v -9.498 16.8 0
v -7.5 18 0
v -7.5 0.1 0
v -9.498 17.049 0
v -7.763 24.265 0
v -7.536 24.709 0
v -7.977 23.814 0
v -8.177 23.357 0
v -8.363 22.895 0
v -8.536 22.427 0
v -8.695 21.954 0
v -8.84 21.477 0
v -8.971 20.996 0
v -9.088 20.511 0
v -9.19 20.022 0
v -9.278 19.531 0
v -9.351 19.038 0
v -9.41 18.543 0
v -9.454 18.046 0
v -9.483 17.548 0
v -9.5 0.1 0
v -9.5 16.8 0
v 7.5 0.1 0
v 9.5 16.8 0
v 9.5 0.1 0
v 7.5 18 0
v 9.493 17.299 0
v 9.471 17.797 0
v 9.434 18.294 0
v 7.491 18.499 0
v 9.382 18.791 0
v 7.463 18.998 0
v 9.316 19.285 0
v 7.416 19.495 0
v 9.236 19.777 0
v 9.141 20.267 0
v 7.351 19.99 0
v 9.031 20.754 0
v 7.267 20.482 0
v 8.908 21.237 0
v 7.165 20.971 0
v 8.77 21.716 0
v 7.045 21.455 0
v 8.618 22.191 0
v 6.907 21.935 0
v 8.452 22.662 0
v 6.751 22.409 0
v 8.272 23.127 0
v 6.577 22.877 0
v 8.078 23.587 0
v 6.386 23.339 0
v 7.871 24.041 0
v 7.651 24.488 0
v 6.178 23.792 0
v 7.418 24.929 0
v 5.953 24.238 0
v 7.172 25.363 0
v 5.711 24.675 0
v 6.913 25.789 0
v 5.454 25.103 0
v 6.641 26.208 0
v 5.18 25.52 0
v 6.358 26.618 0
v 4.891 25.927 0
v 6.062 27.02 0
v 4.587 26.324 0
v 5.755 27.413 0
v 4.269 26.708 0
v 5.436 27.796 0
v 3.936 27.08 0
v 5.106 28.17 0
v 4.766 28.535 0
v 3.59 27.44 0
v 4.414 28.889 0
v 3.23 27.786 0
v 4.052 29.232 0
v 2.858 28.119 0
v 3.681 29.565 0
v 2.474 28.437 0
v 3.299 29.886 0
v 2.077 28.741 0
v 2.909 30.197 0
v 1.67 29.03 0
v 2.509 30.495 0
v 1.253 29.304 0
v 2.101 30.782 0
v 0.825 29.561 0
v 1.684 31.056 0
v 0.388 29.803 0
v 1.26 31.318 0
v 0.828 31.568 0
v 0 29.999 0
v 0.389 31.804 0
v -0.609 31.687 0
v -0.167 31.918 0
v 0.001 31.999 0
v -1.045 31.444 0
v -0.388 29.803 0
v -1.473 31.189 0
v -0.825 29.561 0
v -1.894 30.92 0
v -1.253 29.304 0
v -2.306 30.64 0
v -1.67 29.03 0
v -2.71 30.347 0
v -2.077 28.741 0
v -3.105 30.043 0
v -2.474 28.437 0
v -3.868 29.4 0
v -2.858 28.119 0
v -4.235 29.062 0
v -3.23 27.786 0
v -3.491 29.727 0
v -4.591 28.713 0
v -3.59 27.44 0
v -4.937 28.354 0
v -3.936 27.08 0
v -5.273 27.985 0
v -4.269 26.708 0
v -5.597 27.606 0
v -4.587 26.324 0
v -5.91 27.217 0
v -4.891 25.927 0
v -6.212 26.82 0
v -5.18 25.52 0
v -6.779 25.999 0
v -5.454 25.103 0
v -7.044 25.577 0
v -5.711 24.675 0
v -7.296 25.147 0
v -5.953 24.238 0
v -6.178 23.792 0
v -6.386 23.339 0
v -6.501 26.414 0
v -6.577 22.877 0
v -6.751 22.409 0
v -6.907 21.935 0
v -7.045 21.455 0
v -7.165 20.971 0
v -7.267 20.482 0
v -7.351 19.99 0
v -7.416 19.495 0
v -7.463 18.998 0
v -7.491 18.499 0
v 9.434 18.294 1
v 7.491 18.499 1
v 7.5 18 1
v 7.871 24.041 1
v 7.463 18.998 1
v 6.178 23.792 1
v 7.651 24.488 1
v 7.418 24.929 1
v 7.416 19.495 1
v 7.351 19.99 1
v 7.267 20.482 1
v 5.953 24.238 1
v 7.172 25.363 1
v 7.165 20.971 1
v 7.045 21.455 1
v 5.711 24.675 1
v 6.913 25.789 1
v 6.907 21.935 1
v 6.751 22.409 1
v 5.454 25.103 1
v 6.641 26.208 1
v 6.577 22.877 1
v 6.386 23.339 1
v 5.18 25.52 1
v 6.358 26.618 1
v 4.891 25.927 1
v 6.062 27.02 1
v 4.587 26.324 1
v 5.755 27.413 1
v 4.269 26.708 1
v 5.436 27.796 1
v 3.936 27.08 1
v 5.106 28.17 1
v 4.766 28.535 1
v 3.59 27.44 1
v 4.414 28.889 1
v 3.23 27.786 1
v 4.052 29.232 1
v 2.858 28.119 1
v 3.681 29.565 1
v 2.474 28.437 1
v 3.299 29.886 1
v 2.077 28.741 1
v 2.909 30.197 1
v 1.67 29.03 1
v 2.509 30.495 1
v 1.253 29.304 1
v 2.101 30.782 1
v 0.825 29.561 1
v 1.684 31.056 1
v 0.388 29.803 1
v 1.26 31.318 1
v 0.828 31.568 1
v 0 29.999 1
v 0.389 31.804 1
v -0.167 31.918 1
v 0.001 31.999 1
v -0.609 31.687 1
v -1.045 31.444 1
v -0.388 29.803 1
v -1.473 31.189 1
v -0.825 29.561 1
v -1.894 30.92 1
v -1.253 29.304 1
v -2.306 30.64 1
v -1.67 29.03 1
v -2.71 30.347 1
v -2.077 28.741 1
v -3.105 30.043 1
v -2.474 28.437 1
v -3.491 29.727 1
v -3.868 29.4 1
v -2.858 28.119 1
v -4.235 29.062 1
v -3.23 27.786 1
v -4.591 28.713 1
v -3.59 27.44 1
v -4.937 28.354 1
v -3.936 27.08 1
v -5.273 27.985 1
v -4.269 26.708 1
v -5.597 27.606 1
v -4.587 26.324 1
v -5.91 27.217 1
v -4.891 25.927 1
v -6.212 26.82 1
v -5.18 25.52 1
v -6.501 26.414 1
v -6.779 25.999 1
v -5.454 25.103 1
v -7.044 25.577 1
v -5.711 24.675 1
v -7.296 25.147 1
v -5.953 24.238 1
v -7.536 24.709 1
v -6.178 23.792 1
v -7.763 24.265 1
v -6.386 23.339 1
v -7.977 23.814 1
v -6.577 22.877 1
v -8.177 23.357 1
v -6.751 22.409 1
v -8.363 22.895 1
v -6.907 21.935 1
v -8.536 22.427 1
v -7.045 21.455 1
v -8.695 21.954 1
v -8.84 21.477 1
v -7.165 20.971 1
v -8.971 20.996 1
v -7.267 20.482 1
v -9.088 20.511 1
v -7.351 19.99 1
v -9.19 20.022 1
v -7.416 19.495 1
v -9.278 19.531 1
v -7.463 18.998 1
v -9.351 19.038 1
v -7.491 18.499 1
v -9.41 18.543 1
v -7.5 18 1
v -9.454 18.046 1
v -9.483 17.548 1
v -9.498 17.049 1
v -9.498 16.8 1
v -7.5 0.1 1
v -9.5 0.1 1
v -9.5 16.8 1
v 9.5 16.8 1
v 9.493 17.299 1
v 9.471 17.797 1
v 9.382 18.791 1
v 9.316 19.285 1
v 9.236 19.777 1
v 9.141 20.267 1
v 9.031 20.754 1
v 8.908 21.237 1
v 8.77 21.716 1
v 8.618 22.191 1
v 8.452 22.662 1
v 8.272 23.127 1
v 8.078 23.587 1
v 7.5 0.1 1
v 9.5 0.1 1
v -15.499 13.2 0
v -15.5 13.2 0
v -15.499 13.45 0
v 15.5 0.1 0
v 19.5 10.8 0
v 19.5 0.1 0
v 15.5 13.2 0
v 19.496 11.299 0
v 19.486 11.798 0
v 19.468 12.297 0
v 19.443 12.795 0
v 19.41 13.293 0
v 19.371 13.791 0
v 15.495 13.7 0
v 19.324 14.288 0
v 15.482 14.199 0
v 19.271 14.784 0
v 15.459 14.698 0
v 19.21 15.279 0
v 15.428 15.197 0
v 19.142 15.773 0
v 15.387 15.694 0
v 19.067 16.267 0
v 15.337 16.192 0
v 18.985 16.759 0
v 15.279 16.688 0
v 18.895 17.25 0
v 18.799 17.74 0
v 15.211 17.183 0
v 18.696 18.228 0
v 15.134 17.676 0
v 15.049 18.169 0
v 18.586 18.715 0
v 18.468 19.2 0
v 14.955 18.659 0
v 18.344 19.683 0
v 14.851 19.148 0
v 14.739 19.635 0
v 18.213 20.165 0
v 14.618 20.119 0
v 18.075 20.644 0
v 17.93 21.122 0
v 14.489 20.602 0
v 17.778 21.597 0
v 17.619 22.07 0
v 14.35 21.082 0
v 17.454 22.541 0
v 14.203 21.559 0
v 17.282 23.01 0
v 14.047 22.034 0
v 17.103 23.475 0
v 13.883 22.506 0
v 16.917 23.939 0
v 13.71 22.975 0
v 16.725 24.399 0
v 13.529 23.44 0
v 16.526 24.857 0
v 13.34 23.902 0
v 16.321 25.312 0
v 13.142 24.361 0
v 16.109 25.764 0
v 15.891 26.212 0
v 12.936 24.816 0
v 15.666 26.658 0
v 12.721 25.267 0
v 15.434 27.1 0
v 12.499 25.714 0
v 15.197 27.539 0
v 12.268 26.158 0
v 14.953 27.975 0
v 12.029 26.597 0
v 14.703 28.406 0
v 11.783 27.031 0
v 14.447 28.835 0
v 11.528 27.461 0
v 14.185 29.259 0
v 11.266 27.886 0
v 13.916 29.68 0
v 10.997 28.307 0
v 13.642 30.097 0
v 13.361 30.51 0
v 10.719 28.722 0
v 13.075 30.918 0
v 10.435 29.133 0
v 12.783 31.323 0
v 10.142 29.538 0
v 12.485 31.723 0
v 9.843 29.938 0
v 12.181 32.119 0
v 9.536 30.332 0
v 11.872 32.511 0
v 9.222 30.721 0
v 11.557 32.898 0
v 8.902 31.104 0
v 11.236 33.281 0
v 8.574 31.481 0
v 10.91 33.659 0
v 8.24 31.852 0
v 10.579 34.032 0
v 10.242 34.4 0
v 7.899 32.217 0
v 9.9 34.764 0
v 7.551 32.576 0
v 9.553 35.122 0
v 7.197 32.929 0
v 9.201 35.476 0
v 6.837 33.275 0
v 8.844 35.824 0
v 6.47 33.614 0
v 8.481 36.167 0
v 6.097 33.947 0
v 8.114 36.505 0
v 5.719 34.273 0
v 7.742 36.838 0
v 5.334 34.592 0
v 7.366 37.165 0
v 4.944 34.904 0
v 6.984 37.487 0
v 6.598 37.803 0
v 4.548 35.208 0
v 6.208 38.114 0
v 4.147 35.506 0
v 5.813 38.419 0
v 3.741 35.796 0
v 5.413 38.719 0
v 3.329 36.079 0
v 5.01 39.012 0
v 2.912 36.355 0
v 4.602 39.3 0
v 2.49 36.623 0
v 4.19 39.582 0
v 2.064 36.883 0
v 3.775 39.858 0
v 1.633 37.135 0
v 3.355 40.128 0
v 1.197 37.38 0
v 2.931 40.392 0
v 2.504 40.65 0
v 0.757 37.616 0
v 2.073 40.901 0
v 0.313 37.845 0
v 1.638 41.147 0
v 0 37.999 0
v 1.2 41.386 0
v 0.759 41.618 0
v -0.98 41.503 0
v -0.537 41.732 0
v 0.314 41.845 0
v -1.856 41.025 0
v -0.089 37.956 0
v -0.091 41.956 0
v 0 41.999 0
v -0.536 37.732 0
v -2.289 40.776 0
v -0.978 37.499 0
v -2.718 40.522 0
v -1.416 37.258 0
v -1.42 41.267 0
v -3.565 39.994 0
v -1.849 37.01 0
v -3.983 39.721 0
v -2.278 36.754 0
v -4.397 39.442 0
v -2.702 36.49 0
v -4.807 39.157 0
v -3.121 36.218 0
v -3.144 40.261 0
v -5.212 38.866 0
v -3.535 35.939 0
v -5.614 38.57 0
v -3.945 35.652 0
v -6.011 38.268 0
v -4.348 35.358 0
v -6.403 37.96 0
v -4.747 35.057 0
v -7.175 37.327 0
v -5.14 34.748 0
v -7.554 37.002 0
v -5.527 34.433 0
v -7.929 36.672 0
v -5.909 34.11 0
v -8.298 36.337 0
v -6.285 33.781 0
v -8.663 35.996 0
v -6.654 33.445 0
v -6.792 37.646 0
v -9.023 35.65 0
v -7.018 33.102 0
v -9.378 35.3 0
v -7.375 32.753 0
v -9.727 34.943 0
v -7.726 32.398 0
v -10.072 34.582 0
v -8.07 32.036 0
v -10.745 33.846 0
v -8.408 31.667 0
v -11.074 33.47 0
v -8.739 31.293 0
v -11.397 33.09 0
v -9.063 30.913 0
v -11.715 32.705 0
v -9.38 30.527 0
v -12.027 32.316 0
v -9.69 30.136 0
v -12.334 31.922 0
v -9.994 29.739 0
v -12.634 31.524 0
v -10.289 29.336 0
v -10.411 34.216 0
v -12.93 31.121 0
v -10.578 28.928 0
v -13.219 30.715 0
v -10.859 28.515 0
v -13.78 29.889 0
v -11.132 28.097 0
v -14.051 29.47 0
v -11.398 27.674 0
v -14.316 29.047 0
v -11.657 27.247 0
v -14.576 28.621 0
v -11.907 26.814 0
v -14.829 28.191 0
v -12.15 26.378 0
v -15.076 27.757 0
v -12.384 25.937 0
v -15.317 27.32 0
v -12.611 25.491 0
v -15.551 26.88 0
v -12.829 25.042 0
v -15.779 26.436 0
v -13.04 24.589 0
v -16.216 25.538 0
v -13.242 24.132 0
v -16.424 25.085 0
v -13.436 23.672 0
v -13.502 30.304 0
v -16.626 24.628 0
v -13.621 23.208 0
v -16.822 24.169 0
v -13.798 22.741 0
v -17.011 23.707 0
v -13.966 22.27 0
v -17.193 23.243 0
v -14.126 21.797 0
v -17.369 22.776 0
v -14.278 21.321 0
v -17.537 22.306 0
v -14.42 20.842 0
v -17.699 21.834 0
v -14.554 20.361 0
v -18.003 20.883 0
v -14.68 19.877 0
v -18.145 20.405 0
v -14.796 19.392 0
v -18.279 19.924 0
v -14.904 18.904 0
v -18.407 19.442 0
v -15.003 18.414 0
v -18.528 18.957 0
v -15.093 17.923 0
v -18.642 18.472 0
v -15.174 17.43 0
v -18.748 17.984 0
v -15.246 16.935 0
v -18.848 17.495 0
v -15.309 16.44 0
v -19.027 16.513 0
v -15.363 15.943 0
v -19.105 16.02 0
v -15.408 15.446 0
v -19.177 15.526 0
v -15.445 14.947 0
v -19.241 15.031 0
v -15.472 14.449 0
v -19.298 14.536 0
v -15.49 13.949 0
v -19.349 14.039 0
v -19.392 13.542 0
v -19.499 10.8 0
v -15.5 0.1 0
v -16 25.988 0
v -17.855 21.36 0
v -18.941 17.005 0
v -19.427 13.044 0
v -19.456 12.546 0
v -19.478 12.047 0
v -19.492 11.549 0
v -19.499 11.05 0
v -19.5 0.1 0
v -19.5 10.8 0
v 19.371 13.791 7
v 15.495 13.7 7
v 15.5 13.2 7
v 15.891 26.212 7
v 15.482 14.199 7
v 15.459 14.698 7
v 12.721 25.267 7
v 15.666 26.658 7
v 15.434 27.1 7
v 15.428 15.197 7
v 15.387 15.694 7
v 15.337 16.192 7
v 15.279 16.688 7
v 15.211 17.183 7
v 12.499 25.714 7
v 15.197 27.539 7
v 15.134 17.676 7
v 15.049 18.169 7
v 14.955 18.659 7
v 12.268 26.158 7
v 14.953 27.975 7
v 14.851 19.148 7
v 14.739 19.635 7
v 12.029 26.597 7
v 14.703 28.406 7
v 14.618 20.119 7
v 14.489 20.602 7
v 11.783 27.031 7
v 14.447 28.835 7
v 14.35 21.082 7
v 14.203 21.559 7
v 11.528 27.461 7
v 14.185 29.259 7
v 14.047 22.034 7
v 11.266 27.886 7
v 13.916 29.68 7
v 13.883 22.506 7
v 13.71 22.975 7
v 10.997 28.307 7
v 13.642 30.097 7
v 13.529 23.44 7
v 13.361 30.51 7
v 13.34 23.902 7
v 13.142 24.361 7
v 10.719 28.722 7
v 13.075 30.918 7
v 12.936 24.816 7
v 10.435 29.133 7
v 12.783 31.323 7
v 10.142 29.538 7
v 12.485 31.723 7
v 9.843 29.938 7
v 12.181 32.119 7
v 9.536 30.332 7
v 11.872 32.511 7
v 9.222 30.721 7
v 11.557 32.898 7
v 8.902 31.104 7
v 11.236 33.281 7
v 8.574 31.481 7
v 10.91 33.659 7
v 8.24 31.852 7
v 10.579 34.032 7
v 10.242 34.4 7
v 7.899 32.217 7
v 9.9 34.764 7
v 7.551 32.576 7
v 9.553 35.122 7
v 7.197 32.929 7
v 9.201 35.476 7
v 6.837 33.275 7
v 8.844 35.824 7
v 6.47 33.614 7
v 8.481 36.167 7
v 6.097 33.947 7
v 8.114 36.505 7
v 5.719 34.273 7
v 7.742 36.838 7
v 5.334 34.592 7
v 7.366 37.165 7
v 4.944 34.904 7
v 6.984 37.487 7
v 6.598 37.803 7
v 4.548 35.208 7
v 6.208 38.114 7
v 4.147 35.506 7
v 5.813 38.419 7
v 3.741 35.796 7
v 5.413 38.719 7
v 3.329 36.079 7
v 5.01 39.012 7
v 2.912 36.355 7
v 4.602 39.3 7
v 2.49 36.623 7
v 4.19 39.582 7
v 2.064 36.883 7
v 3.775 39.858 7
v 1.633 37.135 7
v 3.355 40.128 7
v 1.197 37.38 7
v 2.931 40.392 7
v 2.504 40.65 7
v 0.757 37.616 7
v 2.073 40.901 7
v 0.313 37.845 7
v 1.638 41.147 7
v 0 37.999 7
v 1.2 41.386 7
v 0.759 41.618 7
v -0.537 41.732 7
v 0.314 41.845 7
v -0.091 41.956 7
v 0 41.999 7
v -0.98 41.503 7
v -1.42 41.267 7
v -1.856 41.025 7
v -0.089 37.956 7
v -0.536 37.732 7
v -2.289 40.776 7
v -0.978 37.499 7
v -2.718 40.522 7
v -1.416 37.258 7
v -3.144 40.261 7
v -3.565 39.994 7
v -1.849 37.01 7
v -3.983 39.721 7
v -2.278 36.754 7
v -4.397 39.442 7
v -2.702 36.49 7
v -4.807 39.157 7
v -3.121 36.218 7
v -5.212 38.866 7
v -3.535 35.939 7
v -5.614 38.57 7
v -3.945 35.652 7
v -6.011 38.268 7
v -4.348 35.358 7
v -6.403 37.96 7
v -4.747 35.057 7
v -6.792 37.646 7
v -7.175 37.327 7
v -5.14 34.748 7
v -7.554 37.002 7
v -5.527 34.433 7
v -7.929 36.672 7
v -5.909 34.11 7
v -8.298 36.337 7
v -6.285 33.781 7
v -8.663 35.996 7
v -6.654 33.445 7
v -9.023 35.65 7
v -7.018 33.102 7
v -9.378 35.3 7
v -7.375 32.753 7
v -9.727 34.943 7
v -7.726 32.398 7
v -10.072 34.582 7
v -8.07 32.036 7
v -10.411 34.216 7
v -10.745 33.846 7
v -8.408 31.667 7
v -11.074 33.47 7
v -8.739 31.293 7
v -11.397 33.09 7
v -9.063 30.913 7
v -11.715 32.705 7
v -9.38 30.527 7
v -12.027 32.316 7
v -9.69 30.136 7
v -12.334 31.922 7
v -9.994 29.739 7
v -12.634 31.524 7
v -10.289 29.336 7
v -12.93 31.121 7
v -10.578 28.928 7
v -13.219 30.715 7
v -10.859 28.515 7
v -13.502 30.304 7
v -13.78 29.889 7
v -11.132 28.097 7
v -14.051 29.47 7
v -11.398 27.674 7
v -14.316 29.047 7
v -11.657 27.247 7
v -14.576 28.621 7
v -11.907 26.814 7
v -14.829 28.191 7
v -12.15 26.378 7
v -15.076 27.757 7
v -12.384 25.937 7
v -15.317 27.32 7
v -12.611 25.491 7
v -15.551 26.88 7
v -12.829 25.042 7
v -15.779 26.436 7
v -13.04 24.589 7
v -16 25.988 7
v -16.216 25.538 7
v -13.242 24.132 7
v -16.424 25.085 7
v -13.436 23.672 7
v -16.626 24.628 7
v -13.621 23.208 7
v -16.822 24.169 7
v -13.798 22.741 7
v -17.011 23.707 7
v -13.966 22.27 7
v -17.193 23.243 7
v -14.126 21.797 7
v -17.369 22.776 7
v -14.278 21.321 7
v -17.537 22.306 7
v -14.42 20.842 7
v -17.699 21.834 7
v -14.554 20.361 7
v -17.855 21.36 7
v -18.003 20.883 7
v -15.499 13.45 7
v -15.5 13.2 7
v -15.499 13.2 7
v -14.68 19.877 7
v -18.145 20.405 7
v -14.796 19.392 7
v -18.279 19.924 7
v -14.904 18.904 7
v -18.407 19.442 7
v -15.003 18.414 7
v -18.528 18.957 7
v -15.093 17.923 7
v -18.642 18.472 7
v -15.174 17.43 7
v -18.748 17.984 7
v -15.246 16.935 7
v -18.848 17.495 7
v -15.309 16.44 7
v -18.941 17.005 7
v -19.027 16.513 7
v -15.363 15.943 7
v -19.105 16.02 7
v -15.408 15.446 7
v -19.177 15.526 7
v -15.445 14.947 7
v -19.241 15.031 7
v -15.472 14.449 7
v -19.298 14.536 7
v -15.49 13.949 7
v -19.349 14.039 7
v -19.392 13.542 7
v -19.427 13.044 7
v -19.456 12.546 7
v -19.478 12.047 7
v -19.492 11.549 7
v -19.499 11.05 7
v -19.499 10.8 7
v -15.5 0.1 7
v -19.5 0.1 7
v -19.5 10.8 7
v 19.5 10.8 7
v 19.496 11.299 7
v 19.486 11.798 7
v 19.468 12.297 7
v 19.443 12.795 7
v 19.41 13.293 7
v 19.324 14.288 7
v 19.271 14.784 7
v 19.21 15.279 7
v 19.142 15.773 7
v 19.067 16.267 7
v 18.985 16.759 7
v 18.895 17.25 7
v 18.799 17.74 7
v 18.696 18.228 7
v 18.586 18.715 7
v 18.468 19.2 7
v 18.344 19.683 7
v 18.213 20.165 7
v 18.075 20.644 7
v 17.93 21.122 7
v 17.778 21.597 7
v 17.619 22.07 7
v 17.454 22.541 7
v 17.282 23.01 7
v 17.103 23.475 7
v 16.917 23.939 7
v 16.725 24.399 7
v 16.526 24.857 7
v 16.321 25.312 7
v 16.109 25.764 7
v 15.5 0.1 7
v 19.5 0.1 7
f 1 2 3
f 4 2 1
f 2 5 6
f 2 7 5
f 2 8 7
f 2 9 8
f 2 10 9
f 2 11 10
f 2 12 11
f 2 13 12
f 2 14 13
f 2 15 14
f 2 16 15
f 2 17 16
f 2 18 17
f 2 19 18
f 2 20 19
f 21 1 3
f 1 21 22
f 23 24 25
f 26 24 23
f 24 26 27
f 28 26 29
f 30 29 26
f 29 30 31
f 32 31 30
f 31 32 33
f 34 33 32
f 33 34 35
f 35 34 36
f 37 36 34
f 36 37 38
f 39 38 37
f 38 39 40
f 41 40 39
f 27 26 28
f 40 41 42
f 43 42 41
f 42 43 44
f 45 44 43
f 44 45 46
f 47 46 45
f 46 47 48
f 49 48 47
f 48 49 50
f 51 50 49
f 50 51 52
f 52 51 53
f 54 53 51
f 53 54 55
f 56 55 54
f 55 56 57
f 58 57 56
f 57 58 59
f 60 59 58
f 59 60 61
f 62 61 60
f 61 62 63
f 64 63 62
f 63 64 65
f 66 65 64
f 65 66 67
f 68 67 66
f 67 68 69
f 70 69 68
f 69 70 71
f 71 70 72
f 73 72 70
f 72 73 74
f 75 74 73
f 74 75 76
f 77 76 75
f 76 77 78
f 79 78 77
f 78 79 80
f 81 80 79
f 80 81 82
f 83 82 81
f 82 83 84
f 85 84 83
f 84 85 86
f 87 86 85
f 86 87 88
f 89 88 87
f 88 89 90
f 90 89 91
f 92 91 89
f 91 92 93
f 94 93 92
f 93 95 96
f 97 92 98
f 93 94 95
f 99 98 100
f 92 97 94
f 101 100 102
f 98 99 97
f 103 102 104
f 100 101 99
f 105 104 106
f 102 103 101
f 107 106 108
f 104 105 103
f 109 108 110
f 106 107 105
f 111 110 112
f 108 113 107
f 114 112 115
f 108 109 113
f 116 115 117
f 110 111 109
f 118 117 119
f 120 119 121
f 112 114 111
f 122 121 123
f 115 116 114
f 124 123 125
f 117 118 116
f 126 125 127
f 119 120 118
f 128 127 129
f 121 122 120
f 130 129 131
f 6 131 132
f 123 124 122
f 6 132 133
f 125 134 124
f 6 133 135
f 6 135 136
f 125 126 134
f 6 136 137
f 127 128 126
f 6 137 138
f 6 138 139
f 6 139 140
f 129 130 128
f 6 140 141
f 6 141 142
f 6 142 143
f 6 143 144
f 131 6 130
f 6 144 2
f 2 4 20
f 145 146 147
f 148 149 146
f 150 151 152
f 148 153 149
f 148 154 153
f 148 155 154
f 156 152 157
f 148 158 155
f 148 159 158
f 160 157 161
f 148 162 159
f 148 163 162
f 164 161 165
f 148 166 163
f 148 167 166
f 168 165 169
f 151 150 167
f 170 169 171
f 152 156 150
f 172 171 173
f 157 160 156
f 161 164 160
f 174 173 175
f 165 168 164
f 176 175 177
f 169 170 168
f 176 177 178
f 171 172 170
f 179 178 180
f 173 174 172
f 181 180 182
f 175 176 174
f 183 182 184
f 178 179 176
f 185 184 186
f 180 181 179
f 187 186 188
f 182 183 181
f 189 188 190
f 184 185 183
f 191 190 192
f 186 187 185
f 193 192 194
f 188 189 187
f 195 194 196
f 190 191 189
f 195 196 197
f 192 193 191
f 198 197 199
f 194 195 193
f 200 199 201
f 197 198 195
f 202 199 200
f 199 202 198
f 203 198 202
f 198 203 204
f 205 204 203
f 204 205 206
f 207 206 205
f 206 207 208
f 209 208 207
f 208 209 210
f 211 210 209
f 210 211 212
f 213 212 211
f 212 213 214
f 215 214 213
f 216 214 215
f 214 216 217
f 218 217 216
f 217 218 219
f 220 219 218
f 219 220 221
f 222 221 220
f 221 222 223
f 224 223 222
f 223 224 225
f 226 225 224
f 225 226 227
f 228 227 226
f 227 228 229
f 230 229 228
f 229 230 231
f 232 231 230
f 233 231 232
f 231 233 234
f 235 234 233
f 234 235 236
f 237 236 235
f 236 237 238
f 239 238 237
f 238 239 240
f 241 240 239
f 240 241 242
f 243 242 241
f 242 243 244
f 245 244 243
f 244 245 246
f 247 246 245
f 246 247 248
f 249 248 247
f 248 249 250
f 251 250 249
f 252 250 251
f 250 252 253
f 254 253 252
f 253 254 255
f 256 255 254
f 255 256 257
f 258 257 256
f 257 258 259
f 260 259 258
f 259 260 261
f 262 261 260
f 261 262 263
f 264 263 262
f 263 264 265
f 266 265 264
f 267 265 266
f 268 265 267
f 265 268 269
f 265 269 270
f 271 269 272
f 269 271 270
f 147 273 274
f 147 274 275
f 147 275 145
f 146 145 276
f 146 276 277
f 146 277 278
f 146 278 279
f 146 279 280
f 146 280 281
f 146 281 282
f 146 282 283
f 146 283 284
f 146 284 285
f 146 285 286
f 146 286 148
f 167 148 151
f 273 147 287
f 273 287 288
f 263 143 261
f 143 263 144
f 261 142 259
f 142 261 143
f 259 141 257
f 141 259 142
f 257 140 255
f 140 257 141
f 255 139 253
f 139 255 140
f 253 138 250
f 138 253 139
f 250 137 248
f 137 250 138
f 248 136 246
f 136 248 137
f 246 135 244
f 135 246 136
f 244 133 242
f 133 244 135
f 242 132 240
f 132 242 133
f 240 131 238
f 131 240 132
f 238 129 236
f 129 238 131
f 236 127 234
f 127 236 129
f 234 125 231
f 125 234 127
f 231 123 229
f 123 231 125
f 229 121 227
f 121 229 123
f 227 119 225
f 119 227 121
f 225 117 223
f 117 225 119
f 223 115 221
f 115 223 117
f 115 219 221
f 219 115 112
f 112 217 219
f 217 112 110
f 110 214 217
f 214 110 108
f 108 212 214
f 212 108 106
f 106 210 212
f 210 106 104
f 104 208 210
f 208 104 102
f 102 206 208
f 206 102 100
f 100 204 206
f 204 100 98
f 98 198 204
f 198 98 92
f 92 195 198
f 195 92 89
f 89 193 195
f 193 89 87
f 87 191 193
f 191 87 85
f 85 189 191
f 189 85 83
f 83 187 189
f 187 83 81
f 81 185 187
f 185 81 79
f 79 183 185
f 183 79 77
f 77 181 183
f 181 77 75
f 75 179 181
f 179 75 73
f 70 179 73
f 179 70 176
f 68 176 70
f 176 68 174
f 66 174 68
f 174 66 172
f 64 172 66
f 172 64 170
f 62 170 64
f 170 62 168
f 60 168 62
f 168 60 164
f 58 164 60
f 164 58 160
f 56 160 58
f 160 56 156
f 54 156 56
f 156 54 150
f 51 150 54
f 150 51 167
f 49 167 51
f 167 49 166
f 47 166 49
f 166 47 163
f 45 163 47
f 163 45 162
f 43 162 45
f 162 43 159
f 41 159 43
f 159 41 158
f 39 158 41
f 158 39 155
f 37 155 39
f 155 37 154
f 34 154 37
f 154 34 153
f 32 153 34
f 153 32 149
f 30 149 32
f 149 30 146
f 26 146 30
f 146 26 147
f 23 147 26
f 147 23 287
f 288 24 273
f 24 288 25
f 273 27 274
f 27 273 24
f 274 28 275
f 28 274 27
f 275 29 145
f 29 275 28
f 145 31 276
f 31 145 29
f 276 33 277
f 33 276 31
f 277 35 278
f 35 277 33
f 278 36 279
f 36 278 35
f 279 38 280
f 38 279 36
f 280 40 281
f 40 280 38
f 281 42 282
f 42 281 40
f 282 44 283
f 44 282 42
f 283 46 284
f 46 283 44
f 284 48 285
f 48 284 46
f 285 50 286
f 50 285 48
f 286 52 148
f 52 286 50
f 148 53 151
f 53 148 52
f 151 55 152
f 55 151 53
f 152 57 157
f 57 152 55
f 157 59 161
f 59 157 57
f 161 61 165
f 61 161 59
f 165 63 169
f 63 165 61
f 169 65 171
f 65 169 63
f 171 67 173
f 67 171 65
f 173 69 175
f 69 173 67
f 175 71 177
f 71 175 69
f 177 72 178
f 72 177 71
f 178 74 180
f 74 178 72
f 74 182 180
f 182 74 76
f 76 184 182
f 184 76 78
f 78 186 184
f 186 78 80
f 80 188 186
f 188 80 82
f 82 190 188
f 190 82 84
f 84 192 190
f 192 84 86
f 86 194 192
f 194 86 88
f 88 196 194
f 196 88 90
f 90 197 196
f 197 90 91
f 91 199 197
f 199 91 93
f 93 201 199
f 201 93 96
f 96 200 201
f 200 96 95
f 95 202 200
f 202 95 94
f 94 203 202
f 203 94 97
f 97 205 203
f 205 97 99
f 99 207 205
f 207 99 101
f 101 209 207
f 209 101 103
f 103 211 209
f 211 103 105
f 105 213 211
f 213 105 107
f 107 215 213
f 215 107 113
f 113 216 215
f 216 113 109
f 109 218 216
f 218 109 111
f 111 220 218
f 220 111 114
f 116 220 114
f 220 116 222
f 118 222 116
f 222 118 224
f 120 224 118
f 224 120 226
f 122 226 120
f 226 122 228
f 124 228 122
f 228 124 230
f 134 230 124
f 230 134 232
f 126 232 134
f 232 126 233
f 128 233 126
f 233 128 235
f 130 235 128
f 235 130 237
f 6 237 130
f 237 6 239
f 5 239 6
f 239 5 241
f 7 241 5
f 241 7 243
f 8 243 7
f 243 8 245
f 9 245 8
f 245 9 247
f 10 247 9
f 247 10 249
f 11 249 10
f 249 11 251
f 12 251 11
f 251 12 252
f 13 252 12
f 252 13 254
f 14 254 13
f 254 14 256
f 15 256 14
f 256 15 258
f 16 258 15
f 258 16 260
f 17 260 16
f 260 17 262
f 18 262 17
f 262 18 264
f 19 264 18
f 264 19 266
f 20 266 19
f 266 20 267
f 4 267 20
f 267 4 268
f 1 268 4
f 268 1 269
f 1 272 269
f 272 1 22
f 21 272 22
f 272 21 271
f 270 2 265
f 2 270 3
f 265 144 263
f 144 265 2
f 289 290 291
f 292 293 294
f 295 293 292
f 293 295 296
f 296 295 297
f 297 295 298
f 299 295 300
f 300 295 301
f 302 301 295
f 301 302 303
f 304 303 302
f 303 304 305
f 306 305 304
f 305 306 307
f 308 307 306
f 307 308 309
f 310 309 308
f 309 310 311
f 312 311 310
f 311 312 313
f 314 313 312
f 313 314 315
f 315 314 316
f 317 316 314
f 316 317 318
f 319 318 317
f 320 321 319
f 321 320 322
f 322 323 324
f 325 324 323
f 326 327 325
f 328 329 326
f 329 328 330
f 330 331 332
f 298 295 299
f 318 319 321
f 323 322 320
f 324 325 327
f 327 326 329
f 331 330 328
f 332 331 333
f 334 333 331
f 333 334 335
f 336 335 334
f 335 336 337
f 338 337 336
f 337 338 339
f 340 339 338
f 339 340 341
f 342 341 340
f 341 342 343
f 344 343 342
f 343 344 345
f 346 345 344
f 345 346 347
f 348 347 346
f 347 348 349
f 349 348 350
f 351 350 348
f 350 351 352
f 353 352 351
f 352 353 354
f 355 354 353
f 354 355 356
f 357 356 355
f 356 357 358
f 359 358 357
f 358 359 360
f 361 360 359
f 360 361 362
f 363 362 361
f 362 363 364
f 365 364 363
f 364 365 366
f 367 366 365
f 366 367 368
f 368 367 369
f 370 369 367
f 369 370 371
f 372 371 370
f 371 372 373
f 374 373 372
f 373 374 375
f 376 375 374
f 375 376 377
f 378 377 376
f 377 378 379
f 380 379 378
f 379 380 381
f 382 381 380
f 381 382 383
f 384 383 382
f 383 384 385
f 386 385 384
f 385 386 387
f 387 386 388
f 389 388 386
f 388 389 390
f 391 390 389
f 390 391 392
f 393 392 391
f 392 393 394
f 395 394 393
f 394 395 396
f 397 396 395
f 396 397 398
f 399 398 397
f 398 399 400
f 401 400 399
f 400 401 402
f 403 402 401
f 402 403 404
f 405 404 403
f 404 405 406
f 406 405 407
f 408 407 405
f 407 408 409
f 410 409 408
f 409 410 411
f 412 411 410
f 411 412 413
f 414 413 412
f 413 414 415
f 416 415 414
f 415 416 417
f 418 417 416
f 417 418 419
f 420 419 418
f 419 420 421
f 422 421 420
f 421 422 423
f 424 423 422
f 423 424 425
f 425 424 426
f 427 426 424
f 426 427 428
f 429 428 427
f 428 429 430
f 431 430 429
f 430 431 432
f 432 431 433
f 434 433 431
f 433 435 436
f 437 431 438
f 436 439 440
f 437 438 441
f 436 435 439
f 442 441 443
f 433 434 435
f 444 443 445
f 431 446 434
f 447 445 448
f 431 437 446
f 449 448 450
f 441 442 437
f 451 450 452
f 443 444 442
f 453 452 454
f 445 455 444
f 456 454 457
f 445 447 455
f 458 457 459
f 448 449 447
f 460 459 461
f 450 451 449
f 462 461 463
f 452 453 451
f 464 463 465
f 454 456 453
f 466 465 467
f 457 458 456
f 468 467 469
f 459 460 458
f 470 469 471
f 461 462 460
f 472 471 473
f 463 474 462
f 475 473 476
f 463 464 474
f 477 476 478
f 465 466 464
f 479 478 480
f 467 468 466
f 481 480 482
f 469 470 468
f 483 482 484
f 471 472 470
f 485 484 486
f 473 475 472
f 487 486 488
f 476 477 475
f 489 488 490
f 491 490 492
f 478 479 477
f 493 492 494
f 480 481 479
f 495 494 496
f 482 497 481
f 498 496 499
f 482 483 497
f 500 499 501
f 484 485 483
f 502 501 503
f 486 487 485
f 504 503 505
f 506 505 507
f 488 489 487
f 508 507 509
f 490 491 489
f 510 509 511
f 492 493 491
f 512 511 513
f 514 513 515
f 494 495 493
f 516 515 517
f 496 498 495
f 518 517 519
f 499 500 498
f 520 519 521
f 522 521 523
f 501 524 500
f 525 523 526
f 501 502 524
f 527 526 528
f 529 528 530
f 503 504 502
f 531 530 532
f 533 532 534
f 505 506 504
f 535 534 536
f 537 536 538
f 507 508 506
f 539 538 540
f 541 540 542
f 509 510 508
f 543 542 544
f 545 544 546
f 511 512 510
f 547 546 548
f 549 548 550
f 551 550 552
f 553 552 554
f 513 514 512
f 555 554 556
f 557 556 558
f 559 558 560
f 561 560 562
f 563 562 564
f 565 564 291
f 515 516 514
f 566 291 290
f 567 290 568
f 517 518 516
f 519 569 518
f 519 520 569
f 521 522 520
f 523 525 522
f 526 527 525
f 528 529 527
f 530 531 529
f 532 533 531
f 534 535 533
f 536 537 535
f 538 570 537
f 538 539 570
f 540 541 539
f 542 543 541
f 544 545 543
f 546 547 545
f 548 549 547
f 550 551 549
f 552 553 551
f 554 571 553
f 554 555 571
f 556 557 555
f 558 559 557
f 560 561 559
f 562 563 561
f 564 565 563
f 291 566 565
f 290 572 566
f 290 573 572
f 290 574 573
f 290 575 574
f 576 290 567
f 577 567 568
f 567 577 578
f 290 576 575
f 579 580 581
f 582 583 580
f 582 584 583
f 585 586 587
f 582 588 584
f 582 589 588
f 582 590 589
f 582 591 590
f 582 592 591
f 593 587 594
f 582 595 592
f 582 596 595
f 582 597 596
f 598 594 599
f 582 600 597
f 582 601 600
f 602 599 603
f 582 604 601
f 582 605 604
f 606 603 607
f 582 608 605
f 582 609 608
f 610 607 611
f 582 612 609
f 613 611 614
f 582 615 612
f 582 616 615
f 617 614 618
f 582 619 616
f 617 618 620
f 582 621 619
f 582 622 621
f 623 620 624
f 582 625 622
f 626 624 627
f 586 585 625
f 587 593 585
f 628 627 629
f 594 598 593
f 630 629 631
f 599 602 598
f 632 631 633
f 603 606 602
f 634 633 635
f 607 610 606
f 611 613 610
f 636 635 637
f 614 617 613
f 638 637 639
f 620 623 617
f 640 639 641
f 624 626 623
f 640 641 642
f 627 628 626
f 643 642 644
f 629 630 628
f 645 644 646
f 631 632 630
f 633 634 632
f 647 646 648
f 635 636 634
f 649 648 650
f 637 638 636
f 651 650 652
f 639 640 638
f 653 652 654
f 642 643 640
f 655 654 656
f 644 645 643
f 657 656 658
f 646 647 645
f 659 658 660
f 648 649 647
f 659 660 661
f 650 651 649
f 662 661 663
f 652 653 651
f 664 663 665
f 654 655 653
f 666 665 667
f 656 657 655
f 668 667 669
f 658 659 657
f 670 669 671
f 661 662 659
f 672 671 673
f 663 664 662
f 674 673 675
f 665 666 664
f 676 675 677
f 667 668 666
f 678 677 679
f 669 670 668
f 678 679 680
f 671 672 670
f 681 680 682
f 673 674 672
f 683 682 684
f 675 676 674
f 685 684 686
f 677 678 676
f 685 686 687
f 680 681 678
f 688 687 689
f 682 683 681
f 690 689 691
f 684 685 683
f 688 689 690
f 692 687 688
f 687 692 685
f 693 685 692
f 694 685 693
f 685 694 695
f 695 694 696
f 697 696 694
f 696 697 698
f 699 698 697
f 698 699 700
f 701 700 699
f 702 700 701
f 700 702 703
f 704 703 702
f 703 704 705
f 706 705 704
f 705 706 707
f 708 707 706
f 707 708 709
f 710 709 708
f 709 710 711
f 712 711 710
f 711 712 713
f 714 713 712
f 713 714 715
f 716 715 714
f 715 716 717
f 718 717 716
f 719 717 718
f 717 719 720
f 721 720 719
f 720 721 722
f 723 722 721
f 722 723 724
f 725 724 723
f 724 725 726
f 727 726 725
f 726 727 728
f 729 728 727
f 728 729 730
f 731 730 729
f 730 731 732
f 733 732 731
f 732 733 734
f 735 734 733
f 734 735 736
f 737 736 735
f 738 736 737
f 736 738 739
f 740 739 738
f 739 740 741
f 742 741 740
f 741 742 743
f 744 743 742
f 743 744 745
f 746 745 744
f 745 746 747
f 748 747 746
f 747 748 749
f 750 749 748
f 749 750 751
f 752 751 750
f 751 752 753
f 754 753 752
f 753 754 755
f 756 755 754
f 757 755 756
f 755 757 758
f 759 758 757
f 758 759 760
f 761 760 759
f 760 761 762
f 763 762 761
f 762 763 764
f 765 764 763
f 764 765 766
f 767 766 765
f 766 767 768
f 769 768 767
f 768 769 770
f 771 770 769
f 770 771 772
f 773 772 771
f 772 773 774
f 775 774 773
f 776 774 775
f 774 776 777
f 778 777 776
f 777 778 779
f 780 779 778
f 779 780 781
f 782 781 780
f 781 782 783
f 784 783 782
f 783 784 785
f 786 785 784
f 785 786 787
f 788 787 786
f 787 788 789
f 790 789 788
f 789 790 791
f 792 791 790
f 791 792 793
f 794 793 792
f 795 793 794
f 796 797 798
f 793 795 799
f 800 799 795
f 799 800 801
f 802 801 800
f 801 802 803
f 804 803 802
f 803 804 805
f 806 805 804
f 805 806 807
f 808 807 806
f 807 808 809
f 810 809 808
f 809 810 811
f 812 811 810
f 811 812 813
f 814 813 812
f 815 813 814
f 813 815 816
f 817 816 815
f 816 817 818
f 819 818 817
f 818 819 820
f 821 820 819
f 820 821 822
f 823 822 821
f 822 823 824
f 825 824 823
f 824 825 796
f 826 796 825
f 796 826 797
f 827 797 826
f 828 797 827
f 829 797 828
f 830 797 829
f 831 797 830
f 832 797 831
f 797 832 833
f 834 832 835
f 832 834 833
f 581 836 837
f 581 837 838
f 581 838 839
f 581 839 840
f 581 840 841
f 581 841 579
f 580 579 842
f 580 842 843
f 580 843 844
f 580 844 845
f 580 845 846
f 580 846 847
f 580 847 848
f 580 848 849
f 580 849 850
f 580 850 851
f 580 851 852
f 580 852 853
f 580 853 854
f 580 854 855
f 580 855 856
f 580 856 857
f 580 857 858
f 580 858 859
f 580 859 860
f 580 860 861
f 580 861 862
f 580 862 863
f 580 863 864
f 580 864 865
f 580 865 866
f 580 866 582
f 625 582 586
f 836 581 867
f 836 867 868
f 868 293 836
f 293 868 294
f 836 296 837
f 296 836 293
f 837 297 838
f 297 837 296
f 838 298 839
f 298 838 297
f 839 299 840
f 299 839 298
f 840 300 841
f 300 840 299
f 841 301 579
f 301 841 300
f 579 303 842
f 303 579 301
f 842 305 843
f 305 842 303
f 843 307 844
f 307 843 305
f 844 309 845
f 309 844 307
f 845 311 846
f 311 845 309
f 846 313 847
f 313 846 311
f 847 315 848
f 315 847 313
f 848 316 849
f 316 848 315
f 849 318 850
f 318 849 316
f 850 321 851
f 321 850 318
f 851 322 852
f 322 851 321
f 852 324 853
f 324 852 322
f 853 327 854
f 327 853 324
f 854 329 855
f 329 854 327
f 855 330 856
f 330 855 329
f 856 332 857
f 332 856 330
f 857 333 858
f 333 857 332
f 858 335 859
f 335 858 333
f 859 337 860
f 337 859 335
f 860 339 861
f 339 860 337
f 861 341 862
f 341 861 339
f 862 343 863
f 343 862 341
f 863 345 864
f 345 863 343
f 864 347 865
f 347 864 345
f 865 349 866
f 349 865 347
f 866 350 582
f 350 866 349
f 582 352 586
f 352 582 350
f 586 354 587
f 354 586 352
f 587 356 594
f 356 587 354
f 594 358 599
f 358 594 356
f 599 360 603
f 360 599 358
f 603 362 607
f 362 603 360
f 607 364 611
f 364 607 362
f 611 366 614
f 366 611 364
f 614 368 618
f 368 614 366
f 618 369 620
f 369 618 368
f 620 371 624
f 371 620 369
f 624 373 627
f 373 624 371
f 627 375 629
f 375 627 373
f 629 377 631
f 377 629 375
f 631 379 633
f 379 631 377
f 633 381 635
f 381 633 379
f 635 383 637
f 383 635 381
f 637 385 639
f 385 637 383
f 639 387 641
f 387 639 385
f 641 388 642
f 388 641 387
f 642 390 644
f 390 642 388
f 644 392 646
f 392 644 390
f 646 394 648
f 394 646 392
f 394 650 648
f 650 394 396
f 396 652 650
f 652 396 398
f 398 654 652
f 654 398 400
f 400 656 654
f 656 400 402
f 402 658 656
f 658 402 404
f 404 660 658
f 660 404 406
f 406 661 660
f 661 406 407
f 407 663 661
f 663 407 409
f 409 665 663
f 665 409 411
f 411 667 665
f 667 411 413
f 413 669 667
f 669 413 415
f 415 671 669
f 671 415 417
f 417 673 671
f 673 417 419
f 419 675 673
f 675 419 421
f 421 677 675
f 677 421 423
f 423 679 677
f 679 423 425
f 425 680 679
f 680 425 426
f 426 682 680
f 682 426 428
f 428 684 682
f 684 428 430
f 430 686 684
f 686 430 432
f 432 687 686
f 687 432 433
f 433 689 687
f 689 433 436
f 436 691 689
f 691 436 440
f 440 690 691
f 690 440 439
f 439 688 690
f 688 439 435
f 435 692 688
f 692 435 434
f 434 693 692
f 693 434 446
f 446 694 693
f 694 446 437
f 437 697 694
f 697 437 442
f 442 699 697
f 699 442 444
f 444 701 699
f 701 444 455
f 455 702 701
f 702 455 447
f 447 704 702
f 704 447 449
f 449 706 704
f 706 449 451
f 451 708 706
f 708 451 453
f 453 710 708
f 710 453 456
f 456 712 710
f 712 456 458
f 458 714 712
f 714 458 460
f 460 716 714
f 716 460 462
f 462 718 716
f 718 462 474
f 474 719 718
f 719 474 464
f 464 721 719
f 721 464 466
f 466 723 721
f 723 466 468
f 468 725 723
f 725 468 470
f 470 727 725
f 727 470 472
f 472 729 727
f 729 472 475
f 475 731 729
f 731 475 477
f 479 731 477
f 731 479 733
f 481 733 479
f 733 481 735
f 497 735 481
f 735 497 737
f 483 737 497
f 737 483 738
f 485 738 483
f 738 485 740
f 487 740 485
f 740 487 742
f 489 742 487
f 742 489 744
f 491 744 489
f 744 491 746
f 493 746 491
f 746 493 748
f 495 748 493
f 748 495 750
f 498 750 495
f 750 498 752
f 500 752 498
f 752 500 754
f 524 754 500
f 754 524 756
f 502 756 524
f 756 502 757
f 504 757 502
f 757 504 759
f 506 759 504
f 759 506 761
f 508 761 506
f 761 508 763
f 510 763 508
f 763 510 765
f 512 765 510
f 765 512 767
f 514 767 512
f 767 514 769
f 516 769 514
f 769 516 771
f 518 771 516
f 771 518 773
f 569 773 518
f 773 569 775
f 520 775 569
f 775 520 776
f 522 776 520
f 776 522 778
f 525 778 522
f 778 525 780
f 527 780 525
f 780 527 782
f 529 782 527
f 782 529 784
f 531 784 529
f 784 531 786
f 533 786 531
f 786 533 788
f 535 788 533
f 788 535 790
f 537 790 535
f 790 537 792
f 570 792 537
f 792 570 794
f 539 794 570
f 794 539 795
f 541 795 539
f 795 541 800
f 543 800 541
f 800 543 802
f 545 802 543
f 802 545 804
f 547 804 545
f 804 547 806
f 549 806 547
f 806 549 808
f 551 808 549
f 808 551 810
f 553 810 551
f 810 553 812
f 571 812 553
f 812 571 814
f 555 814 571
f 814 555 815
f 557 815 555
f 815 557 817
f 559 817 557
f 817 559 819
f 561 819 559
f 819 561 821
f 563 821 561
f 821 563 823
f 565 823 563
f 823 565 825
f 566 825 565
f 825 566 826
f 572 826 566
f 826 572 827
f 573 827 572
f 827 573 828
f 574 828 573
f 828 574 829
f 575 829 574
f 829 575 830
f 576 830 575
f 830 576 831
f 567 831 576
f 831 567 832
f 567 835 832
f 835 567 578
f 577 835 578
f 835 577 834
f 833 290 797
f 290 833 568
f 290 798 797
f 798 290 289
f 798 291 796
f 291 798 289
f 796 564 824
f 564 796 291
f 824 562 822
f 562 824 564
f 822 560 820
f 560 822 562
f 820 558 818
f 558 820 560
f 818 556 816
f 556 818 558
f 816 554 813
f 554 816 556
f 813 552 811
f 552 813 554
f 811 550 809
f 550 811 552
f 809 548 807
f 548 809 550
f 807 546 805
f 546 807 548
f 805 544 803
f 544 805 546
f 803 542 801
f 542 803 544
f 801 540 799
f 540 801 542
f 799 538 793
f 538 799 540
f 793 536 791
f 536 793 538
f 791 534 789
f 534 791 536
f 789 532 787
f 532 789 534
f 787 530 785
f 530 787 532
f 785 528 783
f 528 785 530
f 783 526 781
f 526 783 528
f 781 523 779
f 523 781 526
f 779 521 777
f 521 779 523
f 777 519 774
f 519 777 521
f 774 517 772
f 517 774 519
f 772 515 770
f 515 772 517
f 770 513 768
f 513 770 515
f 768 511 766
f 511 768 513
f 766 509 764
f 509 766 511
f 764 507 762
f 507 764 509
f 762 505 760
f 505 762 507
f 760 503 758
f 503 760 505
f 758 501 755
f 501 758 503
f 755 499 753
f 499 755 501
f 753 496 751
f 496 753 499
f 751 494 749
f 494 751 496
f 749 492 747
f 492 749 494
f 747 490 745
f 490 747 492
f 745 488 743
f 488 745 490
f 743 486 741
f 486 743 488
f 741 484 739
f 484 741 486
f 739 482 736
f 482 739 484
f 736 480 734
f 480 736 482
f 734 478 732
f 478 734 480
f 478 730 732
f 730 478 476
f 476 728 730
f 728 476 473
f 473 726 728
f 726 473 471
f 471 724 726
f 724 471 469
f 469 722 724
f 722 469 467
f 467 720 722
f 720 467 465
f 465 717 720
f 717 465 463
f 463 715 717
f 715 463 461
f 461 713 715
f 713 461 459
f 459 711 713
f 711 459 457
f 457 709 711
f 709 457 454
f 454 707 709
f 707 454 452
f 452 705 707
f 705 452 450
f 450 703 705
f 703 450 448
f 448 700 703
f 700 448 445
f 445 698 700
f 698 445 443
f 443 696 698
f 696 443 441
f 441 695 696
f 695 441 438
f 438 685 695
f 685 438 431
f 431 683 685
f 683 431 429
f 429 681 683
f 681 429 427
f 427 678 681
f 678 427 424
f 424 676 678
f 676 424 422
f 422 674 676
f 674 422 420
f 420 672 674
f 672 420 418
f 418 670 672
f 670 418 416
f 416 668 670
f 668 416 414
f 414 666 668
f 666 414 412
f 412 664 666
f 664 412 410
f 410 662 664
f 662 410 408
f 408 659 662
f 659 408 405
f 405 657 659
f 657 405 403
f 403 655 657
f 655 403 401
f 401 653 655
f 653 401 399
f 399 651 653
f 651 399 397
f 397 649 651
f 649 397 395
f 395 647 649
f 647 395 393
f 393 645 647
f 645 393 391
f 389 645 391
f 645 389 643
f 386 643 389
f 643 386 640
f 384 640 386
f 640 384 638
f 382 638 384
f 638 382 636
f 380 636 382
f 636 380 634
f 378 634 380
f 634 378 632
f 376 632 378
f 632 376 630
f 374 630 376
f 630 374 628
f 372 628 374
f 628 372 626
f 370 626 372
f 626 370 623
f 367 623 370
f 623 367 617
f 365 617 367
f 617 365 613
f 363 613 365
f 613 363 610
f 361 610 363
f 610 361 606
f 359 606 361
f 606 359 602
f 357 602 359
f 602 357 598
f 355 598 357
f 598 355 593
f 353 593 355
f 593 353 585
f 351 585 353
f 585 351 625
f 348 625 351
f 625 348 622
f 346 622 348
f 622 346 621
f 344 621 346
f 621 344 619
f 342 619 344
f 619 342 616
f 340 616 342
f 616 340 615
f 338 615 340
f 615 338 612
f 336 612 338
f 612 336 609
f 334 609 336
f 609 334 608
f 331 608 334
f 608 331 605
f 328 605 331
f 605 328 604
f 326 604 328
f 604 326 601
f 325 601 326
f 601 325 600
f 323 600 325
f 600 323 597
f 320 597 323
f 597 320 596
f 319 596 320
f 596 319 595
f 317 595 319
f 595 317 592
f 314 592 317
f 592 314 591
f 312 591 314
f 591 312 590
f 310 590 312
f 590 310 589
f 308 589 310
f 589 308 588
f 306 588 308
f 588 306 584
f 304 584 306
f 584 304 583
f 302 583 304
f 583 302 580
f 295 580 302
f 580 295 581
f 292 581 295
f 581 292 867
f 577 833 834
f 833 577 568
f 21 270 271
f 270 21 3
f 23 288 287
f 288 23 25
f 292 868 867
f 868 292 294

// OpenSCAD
module arch(x,y,r) {
      union() {
        intersection () {
           translate([x,y,0]) circle(r);
           translate([-x,y,0]) circle(r);
      }
      translate([0,y/2,0]) square(size=[2 *(r-x), y],center=true);
 }
}


module ogive_arch(width,height,sharpness) {
  assign(base=width/2, length = width * sharpness)
  assign(radius = (base * base + length * length) / (2 * base))
  assign(x= radius - base,y = height-length)
     arch(x,y,radius);
}

module ogive_archway(width,height,sharpness,thickness) {
      difference () {
         ogive_arch(width,height,sharpness);
         ogive_arch(width- 2* thickness,height-thickness,sharpness);
  }
}

module ogive_solid_archway(width,height,sharpness,thickness,depth) {
   linear_extrude(height=depth)
      ogive_archway(width,height,sharpness,thickness);
}

function v_sum_r(v,n,k) =
      k > n ? 0 : v[k] + v_sum_r(v,n,k+1);

function v_sum(v,n) = v_sum_r(v,n-1,0);

module variable_nested_archway (width,height,sharpness,thickness,depth,n) {
  union() {
       for (i=[0:n-1]) {
       assign(dt =  v_sum(thickness,i+1) ) {
          ogive_solid_archway(width + 2 * dt, height+ dt, sharpness,thickness[i],depth[i]);
      }
    }
  }
}

module remove_ground() {
   difference()  {
     child(0);
     translate([0,-49.9,0]) cube([100,100,100],center=true);
  }
}
$fa = 0.01; $fs = 0.5; 

remove_ground() 
    variable_nested_archway(15,30,0.8,[2,4,2,4],[1,3,5,7],4);
   
